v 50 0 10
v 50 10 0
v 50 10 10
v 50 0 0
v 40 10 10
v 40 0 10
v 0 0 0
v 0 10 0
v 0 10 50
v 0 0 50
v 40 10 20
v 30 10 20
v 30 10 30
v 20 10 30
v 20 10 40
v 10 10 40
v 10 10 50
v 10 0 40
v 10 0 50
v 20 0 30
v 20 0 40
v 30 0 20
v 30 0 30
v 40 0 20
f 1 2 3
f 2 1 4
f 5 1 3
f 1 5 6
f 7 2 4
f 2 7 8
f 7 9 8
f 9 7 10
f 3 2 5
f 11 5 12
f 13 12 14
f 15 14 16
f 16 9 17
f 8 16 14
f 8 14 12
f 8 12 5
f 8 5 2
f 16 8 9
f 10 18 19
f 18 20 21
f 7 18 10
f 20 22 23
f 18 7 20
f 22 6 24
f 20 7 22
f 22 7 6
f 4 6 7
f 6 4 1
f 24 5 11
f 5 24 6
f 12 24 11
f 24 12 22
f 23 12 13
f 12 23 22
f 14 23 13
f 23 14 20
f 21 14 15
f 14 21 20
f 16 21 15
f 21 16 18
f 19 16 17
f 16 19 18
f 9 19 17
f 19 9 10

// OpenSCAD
steps = 5;
stepsize = 10;
for(step = [0:steps]) {
	translate([0,0,step * stepsize]) {
		cube([(steps - step) * stepsize, stepsize, stepsize]);
	}
}
